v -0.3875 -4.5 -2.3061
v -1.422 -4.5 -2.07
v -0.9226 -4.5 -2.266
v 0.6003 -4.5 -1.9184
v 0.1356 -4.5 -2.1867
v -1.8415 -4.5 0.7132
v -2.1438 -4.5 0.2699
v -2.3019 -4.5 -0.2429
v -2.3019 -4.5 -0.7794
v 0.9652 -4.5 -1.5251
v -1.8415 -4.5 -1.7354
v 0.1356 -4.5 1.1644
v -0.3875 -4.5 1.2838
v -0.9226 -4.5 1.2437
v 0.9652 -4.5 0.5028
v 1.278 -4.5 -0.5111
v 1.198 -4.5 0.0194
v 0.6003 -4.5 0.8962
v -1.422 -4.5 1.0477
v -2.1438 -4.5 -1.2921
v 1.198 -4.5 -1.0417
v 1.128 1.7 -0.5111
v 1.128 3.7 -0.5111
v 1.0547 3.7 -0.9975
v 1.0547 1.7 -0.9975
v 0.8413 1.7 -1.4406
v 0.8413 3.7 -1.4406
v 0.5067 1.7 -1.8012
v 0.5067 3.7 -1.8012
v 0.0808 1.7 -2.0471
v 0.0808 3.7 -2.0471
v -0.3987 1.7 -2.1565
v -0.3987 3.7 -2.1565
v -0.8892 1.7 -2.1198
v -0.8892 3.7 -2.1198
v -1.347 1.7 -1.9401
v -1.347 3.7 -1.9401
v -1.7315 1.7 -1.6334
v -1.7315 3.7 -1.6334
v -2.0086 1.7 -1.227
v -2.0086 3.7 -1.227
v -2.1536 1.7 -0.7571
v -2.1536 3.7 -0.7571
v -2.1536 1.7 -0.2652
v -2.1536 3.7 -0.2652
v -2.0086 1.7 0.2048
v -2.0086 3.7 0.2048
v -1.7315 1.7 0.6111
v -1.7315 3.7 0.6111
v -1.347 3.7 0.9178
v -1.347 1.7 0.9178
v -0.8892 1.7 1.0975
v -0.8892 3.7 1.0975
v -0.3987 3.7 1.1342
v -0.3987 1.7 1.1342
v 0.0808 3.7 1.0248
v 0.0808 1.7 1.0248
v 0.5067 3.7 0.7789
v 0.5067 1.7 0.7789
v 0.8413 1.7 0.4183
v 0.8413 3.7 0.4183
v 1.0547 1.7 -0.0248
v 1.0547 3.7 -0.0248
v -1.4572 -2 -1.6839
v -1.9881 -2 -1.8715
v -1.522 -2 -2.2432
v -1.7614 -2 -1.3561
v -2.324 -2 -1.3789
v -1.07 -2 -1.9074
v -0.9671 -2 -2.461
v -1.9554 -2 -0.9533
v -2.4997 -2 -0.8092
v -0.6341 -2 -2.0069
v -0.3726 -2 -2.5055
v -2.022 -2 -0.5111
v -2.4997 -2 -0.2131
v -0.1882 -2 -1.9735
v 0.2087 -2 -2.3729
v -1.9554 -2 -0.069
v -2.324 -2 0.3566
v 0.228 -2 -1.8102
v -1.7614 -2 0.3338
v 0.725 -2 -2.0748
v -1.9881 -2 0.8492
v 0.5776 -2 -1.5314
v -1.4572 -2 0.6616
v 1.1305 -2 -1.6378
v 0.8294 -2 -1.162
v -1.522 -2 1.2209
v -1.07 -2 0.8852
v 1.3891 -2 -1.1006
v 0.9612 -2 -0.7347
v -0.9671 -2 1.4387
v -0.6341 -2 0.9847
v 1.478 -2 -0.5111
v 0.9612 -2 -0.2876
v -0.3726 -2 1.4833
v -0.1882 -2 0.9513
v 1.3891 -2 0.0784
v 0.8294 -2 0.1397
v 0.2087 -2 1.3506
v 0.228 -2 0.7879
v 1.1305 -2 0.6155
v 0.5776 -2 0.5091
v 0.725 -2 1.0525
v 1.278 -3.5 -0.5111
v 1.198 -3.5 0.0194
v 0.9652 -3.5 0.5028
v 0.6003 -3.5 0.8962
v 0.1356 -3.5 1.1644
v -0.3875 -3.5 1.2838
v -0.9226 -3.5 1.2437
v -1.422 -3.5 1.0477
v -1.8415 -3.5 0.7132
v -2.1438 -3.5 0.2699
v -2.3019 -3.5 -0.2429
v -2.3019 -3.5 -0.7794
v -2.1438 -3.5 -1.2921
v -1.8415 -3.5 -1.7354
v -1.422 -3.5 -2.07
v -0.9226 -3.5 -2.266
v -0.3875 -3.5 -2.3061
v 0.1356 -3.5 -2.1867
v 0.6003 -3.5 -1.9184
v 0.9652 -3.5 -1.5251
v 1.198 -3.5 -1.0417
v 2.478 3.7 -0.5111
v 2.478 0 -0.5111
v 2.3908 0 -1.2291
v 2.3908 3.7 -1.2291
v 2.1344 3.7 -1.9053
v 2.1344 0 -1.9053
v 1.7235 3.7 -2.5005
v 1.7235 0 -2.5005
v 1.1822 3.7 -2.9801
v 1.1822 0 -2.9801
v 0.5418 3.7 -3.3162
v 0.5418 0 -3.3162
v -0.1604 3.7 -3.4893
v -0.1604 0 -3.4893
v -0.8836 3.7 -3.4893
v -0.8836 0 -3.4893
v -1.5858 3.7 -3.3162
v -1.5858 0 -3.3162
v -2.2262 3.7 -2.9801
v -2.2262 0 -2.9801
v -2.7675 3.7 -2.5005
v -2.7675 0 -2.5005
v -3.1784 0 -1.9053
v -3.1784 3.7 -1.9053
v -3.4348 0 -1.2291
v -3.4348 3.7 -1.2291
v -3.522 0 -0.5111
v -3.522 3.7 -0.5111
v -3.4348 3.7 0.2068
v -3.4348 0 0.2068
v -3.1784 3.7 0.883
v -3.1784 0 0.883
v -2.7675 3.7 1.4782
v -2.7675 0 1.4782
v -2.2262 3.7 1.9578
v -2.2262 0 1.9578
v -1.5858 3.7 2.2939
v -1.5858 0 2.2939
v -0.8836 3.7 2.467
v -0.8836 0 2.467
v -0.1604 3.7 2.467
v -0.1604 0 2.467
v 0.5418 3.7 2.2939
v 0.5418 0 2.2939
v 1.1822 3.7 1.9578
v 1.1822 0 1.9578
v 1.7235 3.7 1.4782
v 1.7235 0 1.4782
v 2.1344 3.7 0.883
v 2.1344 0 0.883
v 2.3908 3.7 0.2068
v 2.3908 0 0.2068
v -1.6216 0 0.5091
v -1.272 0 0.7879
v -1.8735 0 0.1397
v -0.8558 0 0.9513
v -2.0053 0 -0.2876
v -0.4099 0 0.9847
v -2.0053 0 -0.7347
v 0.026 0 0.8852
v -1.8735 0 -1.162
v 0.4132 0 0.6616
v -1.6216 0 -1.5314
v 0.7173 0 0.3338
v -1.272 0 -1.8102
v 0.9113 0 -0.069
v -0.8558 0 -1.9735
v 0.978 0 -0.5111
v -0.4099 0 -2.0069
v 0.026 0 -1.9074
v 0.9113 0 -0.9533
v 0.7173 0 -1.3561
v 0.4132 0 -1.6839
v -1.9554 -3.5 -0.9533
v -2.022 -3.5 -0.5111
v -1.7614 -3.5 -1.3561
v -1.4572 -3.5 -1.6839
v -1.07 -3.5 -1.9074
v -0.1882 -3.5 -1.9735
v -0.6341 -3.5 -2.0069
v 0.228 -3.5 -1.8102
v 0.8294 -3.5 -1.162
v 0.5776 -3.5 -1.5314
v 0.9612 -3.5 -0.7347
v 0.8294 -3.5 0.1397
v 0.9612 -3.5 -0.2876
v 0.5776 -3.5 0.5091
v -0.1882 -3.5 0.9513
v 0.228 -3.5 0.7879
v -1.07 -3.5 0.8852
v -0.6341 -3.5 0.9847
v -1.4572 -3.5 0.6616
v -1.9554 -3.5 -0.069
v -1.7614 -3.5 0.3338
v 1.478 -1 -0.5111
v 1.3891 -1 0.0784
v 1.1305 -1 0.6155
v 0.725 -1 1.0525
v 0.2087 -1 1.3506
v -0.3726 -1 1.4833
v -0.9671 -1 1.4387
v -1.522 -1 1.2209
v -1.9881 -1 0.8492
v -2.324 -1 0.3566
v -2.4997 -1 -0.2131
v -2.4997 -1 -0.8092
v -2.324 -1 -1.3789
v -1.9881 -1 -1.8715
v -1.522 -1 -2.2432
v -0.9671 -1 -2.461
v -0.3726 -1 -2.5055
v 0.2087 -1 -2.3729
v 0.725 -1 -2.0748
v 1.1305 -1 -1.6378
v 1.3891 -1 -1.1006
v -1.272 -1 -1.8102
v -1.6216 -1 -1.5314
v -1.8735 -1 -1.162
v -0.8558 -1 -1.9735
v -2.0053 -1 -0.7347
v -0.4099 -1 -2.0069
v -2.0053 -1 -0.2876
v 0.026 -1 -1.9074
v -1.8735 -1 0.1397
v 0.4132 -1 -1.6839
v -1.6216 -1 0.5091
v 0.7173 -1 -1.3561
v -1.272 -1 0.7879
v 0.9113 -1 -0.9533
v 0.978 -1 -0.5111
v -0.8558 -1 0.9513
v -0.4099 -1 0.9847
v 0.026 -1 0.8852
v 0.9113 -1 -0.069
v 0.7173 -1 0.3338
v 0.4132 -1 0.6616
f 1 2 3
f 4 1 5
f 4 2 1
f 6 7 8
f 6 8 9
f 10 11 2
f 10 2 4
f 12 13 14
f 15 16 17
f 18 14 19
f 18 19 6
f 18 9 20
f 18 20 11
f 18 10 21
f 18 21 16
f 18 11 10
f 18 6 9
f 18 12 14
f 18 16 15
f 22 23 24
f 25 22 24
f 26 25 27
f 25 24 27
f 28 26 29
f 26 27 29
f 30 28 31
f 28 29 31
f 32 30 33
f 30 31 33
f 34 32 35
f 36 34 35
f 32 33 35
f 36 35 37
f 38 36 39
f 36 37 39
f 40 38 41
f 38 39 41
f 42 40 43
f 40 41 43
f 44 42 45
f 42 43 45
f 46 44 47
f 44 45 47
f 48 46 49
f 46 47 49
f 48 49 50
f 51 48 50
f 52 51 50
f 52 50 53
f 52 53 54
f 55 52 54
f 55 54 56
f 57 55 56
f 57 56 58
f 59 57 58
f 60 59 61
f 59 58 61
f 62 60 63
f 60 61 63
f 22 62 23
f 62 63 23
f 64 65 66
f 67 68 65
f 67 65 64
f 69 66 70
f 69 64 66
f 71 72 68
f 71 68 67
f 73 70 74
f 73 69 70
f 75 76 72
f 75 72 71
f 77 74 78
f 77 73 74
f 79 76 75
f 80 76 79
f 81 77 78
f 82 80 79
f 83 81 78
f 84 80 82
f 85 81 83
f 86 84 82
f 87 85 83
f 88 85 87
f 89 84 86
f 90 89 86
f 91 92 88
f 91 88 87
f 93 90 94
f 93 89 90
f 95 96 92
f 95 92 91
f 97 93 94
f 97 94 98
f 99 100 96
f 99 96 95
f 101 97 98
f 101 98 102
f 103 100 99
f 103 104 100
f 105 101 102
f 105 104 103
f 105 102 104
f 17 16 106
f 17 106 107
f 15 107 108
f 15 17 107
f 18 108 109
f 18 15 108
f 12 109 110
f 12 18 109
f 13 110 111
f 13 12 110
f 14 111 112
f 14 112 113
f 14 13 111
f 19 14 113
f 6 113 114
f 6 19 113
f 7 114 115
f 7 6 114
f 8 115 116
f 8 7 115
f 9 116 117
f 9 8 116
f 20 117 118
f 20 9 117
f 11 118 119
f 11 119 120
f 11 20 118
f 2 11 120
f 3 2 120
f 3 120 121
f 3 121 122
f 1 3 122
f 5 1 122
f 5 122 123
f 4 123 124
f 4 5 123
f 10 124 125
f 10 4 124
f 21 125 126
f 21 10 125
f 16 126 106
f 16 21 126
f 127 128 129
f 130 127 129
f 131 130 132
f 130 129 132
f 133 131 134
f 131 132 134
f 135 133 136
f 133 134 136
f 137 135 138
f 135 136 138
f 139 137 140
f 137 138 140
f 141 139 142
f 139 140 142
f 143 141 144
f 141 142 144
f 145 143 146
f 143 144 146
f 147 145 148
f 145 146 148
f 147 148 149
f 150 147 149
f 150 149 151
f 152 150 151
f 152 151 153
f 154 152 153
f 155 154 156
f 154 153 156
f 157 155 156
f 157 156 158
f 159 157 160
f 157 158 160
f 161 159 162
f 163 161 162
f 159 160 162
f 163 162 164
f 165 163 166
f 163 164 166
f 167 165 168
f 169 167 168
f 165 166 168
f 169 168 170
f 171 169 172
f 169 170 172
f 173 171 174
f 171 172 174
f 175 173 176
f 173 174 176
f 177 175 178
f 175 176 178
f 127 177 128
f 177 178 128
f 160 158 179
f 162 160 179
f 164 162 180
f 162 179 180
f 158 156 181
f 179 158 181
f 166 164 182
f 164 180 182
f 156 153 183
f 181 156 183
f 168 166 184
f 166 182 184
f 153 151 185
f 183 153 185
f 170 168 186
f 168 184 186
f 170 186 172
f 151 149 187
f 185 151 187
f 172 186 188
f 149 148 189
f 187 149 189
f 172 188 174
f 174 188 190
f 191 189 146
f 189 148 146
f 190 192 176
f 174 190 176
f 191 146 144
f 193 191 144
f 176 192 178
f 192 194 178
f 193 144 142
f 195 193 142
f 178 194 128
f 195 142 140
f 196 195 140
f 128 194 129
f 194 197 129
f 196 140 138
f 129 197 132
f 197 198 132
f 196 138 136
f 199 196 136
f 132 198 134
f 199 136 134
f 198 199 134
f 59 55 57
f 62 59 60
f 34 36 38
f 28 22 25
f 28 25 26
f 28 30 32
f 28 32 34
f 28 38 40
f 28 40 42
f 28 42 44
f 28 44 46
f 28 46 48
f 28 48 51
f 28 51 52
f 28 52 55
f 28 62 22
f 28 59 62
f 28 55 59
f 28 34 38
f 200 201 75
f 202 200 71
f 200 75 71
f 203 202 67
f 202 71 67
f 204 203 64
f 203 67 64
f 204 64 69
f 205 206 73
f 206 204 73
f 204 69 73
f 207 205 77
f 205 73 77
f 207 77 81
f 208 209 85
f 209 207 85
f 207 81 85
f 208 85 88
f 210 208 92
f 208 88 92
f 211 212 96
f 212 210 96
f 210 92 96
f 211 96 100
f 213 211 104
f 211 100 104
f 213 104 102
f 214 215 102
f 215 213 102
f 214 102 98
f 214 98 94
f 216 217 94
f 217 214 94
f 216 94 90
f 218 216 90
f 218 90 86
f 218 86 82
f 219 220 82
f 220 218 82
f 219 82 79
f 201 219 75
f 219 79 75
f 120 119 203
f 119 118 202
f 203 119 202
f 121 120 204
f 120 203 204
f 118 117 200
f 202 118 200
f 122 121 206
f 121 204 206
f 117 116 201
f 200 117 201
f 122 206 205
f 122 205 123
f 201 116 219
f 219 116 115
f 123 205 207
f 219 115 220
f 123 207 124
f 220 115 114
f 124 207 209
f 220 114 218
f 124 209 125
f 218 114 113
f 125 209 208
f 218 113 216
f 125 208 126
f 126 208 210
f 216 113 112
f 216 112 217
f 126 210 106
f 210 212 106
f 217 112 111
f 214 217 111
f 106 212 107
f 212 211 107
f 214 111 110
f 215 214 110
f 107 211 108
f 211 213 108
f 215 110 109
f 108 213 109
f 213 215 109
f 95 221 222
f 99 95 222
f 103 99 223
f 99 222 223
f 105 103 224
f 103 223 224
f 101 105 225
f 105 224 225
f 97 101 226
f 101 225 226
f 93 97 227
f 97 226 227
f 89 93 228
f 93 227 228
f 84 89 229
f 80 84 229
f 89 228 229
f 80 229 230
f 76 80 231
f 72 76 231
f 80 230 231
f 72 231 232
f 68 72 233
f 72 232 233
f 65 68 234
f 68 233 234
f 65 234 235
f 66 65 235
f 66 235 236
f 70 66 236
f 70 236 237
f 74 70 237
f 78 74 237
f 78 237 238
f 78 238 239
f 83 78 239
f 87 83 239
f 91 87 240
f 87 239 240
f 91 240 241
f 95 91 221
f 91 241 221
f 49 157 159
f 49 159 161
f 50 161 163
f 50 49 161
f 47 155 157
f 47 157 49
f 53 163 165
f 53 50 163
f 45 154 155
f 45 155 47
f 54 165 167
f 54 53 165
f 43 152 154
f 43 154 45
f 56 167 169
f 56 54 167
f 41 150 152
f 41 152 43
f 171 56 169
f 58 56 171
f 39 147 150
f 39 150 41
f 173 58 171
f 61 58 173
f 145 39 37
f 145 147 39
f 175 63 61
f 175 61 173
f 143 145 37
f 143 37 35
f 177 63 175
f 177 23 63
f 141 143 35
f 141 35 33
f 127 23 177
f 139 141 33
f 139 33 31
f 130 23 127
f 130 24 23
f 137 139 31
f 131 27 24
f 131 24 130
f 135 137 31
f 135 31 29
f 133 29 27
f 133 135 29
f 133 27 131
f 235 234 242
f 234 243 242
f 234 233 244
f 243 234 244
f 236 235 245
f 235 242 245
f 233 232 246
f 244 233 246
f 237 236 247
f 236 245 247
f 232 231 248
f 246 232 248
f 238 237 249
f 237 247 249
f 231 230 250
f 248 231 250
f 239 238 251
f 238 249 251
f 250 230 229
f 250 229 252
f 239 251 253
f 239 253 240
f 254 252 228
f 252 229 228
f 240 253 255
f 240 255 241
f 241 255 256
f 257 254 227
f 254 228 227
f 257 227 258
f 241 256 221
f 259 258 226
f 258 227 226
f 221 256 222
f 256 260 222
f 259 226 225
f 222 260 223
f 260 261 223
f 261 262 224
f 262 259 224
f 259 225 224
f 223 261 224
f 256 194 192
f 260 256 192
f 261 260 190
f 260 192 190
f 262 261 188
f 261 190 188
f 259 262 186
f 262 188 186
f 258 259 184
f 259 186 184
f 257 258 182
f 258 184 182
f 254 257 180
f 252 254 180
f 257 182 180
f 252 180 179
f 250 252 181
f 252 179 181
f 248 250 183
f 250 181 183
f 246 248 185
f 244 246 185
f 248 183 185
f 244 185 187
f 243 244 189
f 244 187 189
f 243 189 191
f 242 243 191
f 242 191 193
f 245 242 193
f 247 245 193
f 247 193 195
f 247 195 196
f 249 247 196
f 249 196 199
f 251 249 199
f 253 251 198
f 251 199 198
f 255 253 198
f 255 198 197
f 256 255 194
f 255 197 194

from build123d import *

# Parameters (mm, degrees)
SKETCH1_R           = 3
BOSS_EXTRUDE1_DEPTH = 3.7
SKETCH1_3_R         = 1.6
BOSS_EXTRUDE2_DEPTH = 1
SKETCH5_R           = 1.5
BOSS_EXTRUDE3_DEPTH = 1
SKETCH6_R           = 2
BOSS_EXTRUDE4_DEPTH = 1
SKETCH8_R           = 1.5
BOSS_EXTRUDE5_DEPTH = 2.5
SKETCH10_R          = 1.8
BOSS_EXTRUDE6_DEPTH = 1
SKETCH12_R          = 1.65
CUT_EXTRUDE1_DEPTH  = 2


with BuildPart() as part:
    # Sketch1 → Boss-Extrude1 (new body)
    with BuildSketch(Plane(origin=(0, 0, 0), x_dir=(1, 0, 0), z_dir=(0, 1, 0))):
        with Locations((-0.522013312, 0.511138034)):
            Circle(SKETCH1_R)
    extrude(amount=BOSS_EXTRUDE1_DEPTH)

    # Sketch1<3> → Boss-Extrude2 (add)
    with BuildSketch(Plane(origin=(0, 0, 0), x_dir=(1, 0, 0), z_dir=(0, 1, 0))):
        with Locations((-0.522013312, 0.511138034)):
            Circle(SKETCH1_3_R)
    extrude(amount=BOSS_EXTRUDE2_DEPTH)

    # Sketch5 → Boss-Extrude3 (add)
    with BuildSketch(Plane.XZ):
        with Locations((-0.522013312, -0.511138034)):
            Circle(SKETCH5_R)
    extrude(amount=BOSS_EXTRUDE3_DEPTH)

    # Sketch6 → Boss-Extrude4 (add)
    with BuildSketch(Plane.XZ.offset(1)):
        with Locations((-0.522013312, -0.511138034)):
            Circle(SKETCH6_R)
    extrude(amount=BOSS_EXTRUDE4_DEPTH)

    # Sketch8 → Boss-Extrude5 (add)
    with BuildSketch(Plane(origin=(0, -2, 0), x_dir=(-1, 0, 0), z_dir=(0, -1, 0))):
        with Locations((0.522013312, 0.511138034)):
            Circle(SKETCH8_R)
    extrude(amount=BOSS_EXTRUDE5_DEPTH)

    # Sketch10 → Boss-Extrude6 (add)
    with BuildSketch(Plane.XZ.offset(4.5)):
        with Locations((-0.522013312, -0.511138034)):
            Circle(SKETCH10_R)
    extrude(amount=-BOSS_EXTRUDE6_DEPTH)

    # Sketch12 → Cut-Extrude1 (cut)
    with BuildSketch(Plane(origin=(0, 3.7, 0), x_dir=(1, 0, 0), z_dir=(0, 1, 0))):
        with Locations((-0.522013312, 0.511138034)):
            Circle(SKETCH12_R)
    extrude(amount=-CUT_EXTRUDE1_DEPTH, mode=Mode.SUBTRACT)


solid = part.part
